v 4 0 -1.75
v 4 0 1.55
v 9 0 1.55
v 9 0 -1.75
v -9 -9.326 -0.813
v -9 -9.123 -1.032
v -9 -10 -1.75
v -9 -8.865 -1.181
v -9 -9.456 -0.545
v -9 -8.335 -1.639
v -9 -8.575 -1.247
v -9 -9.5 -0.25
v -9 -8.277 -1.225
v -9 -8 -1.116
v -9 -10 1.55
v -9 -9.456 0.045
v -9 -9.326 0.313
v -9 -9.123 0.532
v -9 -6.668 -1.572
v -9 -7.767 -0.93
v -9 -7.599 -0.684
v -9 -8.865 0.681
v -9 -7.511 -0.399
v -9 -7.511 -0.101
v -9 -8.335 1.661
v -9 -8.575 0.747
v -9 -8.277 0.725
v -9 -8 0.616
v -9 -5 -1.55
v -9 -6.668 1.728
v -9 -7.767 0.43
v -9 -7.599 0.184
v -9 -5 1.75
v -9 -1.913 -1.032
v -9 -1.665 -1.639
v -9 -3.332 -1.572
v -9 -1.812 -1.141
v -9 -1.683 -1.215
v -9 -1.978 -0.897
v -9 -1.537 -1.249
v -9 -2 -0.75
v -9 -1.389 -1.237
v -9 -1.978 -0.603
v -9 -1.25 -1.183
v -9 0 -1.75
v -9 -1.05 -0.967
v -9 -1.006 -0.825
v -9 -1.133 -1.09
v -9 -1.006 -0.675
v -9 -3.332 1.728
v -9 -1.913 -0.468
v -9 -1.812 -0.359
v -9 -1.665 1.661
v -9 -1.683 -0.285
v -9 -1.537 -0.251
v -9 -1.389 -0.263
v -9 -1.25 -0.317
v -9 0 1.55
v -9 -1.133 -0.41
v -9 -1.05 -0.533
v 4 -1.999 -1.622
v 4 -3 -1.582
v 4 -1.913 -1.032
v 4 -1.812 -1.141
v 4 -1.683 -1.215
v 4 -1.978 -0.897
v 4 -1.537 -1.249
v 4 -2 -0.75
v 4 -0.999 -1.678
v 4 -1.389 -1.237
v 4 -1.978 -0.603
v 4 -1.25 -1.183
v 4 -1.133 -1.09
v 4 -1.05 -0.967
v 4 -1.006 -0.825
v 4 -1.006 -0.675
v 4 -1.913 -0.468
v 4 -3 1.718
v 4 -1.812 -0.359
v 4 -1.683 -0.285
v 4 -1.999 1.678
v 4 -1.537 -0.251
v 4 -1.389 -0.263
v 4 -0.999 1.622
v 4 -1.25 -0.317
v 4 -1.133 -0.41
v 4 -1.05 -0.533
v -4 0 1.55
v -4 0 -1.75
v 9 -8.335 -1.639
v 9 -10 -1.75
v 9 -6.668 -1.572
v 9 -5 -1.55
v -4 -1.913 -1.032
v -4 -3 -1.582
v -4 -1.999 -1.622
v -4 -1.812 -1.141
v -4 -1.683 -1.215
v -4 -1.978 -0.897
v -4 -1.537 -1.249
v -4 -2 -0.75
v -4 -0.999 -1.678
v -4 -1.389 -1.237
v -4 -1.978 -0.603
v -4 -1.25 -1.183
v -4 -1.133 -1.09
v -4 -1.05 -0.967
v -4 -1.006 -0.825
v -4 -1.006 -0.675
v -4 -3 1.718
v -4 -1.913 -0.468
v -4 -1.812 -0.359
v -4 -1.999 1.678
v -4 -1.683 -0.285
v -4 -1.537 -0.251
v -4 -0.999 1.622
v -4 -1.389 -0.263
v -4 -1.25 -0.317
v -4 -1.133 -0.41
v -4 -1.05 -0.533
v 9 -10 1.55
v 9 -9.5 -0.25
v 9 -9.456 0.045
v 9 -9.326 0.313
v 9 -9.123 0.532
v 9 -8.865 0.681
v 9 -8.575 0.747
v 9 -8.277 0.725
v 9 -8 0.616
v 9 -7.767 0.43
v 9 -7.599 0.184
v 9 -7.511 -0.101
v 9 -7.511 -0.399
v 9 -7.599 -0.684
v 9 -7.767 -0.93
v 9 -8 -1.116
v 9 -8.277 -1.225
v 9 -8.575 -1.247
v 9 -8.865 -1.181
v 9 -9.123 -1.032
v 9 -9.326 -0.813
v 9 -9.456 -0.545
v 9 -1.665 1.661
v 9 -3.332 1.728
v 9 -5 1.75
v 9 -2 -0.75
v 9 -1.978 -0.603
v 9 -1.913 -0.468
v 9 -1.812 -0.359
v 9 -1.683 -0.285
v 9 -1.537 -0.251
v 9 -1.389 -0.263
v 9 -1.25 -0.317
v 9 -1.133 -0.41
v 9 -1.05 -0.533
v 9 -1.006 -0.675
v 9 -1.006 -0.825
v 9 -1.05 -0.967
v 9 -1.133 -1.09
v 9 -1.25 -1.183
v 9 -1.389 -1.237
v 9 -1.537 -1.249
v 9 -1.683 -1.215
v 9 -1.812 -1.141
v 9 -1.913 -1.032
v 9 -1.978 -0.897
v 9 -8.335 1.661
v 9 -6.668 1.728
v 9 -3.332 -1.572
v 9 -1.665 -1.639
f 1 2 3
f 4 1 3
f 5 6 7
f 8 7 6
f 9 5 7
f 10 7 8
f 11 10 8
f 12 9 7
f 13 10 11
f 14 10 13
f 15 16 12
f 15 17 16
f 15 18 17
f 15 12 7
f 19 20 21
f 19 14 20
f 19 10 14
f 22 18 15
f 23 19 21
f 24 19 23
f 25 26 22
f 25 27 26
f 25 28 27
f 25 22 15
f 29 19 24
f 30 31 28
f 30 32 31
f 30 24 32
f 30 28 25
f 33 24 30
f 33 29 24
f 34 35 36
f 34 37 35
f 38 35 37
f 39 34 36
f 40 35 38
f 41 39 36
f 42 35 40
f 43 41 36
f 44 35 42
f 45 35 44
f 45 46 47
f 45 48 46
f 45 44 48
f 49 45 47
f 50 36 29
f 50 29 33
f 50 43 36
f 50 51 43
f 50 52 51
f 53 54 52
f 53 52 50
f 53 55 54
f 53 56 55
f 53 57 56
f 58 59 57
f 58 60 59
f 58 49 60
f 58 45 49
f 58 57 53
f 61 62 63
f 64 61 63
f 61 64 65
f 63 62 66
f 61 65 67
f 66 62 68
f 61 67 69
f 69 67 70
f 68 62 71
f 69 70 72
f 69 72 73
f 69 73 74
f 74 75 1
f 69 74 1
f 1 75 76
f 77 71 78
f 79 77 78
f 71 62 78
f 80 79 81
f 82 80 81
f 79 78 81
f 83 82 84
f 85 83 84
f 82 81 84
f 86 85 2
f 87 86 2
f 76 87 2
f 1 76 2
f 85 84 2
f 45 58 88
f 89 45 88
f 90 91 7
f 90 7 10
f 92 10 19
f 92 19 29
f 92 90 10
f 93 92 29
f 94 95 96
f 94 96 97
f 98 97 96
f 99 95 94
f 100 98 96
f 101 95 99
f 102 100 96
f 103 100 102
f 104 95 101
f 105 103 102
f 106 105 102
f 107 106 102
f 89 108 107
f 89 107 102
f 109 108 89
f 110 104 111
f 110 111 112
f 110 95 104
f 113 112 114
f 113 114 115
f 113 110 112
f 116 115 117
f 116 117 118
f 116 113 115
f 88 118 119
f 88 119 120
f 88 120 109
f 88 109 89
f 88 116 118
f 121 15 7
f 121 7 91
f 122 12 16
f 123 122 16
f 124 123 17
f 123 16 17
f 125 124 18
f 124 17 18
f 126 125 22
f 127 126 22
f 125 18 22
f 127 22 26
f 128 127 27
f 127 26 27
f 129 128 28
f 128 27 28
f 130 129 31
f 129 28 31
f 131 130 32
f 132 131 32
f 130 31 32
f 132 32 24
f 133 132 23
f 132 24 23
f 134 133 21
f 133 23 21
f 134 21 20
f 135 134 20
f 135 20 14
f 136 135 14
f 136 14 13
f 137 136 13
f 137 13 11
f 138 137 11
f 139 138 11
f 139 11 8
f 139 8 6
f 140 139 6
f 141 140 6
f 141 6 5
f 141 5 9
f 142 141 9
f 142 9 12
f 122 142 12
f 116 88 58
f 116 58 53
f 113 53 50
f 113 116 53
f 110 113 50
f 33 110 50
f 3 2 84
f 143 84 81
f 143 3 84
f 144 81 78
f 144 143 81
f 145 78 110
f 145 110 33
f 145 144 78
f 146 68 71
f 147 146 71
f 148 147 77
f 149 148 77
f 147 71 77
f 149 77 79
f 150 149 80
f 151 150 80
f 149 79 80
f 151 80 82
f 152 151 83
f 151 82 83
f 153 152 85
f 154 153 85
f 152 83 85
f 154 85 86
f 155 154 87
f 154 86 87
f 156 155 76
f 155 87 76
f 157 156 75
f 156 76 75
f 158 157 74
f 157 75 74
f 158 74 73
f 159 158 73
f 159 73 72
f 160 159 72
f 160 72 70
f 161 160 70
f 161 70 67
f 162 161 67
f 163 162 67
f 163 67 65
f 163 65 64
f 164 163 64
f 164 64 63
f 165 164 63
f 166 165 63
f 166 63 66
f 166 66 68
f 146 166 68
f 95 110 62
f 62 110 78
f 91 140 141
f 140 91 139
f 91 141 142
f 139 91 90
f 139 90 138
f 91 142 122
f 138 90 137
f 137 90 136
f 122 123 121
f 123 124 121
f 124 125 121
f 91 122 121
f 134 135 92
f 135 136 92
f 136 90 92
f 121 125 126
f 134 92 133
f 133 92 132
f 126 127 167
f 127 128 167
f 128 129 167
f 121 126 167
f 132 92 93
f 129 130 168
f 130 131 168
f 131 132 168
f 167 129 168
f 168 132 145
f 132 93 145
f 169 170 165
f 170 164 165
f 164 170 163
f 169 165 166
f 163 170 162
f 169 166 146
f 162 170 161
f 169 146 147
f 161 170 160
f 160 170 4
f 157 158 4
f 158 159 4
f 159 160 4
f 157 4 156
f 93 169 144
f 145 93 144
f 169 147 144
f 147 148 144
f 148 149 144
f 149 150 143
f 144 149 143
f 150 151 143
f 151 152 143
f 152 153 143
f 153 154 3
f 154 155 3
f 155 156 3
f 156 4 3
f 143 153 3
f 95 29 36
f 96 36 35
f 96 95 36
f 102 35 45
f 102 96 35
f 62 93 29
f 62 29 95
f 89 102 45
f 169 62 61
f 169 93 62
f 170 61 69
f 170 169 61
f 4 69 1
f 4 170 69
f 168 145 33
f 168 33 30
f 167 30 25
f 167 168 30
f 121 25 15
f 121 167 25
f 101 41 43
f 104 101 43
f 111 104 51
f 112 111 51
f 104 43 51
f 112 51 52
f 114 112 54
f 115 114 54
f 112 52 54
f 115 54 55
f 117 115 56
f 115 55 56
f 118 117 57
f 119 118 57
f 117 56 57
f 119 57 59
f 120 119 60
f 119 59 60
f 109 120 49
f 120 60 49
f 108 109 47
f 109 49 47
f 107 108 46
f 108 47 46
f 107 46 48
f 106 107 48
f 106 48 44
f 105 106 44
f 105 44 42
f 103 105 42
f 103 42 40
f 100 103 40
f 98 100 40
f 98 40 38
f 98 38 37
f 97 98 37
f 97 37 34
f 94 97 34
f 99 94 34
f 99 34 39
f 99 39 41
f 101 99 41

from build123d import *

# Parameters (mm, degrees)
F0_W     = 18
F0_H     = 3.5
F1_DEPTH = 10
F2_W     = 8
F2_H     = 6
F3_DEPTH = 25
F4_DEPTH = 21.2
F6_DEPTH = 18
F7_R     = 1
F8_DEPTH = 25


with BuildPart() as f1:
    # F0 (on Front) → F1 (new body)
    with BuildSketch(Plane.XZ):
        Rectangle(F0_W, F0_H)
    extrude(amount=F1_DEPTH)

    # F2 (on Top) → F3 (cut)
    with BuildSketch(Plane.XY):
        Rectangle(F2_W, F2_H)
    extrude(amount=-F3_DEPTH, mode=Mode.SUBTRACT)

    # F2 (on Top) → F4 (cut)
    with BuildSketch(Plane.XY):
        Rectangle(F2_W, F2_H)
    extrude(amount=F4_DEPTH, mode=Mode.SUBTRACT)

    # F5 (on face) → F6 (intersect)
    with BuildSketch(Plane.YZ.offset(9)):
        with BuildLine():
            ThreePointArc((0, 1.55), (-2.498001, 1.69998), (-5, 1.75))
            Line((-5, 1.75), (-5, -1.55))
            ThreePointArc((-5, -1.55), (-2.498001, -1.60002), (0, -1.75))
            Line((0, -1.75), (0, 1.55))
        make_face()
        with BuildLine():
            Line((-5, -1.55), (-5, 1.75))
            ThreePointArc((-5, 1.75), (-7.501999, 1.69998), (-10, 1.55))
            Line((-10, 1.55), (-10, -1.75))
            ThreePointArc((-10, -1.75), (-7.501999, -1.60002), (-5, -1.55))
        make_face()
    extrude(amount=-F6_DEPTH, mode=Mode.INTERSECT)

    # F7 (on face) → F8 (cut)
    with BuildSketch(Plane(origin=(-9, 0, 0), x_dir=(0, -1, 0), z_dir=(-1, 0, 0))):
        with BuildLine():
            ThreePointArc((1, -0.75), (1.5, -1.25), (2, -0.75))
            ThreePointArc((2, -0.75), (1.5, -0.25), (1, -0.75))
        make_face()
        with Locations((8.5, -0.25)):
            Circle(F7_R)
    extrude(amount=-F8_DEPTH, mode=Mode.SUBTRACT)


solid = f1.part
